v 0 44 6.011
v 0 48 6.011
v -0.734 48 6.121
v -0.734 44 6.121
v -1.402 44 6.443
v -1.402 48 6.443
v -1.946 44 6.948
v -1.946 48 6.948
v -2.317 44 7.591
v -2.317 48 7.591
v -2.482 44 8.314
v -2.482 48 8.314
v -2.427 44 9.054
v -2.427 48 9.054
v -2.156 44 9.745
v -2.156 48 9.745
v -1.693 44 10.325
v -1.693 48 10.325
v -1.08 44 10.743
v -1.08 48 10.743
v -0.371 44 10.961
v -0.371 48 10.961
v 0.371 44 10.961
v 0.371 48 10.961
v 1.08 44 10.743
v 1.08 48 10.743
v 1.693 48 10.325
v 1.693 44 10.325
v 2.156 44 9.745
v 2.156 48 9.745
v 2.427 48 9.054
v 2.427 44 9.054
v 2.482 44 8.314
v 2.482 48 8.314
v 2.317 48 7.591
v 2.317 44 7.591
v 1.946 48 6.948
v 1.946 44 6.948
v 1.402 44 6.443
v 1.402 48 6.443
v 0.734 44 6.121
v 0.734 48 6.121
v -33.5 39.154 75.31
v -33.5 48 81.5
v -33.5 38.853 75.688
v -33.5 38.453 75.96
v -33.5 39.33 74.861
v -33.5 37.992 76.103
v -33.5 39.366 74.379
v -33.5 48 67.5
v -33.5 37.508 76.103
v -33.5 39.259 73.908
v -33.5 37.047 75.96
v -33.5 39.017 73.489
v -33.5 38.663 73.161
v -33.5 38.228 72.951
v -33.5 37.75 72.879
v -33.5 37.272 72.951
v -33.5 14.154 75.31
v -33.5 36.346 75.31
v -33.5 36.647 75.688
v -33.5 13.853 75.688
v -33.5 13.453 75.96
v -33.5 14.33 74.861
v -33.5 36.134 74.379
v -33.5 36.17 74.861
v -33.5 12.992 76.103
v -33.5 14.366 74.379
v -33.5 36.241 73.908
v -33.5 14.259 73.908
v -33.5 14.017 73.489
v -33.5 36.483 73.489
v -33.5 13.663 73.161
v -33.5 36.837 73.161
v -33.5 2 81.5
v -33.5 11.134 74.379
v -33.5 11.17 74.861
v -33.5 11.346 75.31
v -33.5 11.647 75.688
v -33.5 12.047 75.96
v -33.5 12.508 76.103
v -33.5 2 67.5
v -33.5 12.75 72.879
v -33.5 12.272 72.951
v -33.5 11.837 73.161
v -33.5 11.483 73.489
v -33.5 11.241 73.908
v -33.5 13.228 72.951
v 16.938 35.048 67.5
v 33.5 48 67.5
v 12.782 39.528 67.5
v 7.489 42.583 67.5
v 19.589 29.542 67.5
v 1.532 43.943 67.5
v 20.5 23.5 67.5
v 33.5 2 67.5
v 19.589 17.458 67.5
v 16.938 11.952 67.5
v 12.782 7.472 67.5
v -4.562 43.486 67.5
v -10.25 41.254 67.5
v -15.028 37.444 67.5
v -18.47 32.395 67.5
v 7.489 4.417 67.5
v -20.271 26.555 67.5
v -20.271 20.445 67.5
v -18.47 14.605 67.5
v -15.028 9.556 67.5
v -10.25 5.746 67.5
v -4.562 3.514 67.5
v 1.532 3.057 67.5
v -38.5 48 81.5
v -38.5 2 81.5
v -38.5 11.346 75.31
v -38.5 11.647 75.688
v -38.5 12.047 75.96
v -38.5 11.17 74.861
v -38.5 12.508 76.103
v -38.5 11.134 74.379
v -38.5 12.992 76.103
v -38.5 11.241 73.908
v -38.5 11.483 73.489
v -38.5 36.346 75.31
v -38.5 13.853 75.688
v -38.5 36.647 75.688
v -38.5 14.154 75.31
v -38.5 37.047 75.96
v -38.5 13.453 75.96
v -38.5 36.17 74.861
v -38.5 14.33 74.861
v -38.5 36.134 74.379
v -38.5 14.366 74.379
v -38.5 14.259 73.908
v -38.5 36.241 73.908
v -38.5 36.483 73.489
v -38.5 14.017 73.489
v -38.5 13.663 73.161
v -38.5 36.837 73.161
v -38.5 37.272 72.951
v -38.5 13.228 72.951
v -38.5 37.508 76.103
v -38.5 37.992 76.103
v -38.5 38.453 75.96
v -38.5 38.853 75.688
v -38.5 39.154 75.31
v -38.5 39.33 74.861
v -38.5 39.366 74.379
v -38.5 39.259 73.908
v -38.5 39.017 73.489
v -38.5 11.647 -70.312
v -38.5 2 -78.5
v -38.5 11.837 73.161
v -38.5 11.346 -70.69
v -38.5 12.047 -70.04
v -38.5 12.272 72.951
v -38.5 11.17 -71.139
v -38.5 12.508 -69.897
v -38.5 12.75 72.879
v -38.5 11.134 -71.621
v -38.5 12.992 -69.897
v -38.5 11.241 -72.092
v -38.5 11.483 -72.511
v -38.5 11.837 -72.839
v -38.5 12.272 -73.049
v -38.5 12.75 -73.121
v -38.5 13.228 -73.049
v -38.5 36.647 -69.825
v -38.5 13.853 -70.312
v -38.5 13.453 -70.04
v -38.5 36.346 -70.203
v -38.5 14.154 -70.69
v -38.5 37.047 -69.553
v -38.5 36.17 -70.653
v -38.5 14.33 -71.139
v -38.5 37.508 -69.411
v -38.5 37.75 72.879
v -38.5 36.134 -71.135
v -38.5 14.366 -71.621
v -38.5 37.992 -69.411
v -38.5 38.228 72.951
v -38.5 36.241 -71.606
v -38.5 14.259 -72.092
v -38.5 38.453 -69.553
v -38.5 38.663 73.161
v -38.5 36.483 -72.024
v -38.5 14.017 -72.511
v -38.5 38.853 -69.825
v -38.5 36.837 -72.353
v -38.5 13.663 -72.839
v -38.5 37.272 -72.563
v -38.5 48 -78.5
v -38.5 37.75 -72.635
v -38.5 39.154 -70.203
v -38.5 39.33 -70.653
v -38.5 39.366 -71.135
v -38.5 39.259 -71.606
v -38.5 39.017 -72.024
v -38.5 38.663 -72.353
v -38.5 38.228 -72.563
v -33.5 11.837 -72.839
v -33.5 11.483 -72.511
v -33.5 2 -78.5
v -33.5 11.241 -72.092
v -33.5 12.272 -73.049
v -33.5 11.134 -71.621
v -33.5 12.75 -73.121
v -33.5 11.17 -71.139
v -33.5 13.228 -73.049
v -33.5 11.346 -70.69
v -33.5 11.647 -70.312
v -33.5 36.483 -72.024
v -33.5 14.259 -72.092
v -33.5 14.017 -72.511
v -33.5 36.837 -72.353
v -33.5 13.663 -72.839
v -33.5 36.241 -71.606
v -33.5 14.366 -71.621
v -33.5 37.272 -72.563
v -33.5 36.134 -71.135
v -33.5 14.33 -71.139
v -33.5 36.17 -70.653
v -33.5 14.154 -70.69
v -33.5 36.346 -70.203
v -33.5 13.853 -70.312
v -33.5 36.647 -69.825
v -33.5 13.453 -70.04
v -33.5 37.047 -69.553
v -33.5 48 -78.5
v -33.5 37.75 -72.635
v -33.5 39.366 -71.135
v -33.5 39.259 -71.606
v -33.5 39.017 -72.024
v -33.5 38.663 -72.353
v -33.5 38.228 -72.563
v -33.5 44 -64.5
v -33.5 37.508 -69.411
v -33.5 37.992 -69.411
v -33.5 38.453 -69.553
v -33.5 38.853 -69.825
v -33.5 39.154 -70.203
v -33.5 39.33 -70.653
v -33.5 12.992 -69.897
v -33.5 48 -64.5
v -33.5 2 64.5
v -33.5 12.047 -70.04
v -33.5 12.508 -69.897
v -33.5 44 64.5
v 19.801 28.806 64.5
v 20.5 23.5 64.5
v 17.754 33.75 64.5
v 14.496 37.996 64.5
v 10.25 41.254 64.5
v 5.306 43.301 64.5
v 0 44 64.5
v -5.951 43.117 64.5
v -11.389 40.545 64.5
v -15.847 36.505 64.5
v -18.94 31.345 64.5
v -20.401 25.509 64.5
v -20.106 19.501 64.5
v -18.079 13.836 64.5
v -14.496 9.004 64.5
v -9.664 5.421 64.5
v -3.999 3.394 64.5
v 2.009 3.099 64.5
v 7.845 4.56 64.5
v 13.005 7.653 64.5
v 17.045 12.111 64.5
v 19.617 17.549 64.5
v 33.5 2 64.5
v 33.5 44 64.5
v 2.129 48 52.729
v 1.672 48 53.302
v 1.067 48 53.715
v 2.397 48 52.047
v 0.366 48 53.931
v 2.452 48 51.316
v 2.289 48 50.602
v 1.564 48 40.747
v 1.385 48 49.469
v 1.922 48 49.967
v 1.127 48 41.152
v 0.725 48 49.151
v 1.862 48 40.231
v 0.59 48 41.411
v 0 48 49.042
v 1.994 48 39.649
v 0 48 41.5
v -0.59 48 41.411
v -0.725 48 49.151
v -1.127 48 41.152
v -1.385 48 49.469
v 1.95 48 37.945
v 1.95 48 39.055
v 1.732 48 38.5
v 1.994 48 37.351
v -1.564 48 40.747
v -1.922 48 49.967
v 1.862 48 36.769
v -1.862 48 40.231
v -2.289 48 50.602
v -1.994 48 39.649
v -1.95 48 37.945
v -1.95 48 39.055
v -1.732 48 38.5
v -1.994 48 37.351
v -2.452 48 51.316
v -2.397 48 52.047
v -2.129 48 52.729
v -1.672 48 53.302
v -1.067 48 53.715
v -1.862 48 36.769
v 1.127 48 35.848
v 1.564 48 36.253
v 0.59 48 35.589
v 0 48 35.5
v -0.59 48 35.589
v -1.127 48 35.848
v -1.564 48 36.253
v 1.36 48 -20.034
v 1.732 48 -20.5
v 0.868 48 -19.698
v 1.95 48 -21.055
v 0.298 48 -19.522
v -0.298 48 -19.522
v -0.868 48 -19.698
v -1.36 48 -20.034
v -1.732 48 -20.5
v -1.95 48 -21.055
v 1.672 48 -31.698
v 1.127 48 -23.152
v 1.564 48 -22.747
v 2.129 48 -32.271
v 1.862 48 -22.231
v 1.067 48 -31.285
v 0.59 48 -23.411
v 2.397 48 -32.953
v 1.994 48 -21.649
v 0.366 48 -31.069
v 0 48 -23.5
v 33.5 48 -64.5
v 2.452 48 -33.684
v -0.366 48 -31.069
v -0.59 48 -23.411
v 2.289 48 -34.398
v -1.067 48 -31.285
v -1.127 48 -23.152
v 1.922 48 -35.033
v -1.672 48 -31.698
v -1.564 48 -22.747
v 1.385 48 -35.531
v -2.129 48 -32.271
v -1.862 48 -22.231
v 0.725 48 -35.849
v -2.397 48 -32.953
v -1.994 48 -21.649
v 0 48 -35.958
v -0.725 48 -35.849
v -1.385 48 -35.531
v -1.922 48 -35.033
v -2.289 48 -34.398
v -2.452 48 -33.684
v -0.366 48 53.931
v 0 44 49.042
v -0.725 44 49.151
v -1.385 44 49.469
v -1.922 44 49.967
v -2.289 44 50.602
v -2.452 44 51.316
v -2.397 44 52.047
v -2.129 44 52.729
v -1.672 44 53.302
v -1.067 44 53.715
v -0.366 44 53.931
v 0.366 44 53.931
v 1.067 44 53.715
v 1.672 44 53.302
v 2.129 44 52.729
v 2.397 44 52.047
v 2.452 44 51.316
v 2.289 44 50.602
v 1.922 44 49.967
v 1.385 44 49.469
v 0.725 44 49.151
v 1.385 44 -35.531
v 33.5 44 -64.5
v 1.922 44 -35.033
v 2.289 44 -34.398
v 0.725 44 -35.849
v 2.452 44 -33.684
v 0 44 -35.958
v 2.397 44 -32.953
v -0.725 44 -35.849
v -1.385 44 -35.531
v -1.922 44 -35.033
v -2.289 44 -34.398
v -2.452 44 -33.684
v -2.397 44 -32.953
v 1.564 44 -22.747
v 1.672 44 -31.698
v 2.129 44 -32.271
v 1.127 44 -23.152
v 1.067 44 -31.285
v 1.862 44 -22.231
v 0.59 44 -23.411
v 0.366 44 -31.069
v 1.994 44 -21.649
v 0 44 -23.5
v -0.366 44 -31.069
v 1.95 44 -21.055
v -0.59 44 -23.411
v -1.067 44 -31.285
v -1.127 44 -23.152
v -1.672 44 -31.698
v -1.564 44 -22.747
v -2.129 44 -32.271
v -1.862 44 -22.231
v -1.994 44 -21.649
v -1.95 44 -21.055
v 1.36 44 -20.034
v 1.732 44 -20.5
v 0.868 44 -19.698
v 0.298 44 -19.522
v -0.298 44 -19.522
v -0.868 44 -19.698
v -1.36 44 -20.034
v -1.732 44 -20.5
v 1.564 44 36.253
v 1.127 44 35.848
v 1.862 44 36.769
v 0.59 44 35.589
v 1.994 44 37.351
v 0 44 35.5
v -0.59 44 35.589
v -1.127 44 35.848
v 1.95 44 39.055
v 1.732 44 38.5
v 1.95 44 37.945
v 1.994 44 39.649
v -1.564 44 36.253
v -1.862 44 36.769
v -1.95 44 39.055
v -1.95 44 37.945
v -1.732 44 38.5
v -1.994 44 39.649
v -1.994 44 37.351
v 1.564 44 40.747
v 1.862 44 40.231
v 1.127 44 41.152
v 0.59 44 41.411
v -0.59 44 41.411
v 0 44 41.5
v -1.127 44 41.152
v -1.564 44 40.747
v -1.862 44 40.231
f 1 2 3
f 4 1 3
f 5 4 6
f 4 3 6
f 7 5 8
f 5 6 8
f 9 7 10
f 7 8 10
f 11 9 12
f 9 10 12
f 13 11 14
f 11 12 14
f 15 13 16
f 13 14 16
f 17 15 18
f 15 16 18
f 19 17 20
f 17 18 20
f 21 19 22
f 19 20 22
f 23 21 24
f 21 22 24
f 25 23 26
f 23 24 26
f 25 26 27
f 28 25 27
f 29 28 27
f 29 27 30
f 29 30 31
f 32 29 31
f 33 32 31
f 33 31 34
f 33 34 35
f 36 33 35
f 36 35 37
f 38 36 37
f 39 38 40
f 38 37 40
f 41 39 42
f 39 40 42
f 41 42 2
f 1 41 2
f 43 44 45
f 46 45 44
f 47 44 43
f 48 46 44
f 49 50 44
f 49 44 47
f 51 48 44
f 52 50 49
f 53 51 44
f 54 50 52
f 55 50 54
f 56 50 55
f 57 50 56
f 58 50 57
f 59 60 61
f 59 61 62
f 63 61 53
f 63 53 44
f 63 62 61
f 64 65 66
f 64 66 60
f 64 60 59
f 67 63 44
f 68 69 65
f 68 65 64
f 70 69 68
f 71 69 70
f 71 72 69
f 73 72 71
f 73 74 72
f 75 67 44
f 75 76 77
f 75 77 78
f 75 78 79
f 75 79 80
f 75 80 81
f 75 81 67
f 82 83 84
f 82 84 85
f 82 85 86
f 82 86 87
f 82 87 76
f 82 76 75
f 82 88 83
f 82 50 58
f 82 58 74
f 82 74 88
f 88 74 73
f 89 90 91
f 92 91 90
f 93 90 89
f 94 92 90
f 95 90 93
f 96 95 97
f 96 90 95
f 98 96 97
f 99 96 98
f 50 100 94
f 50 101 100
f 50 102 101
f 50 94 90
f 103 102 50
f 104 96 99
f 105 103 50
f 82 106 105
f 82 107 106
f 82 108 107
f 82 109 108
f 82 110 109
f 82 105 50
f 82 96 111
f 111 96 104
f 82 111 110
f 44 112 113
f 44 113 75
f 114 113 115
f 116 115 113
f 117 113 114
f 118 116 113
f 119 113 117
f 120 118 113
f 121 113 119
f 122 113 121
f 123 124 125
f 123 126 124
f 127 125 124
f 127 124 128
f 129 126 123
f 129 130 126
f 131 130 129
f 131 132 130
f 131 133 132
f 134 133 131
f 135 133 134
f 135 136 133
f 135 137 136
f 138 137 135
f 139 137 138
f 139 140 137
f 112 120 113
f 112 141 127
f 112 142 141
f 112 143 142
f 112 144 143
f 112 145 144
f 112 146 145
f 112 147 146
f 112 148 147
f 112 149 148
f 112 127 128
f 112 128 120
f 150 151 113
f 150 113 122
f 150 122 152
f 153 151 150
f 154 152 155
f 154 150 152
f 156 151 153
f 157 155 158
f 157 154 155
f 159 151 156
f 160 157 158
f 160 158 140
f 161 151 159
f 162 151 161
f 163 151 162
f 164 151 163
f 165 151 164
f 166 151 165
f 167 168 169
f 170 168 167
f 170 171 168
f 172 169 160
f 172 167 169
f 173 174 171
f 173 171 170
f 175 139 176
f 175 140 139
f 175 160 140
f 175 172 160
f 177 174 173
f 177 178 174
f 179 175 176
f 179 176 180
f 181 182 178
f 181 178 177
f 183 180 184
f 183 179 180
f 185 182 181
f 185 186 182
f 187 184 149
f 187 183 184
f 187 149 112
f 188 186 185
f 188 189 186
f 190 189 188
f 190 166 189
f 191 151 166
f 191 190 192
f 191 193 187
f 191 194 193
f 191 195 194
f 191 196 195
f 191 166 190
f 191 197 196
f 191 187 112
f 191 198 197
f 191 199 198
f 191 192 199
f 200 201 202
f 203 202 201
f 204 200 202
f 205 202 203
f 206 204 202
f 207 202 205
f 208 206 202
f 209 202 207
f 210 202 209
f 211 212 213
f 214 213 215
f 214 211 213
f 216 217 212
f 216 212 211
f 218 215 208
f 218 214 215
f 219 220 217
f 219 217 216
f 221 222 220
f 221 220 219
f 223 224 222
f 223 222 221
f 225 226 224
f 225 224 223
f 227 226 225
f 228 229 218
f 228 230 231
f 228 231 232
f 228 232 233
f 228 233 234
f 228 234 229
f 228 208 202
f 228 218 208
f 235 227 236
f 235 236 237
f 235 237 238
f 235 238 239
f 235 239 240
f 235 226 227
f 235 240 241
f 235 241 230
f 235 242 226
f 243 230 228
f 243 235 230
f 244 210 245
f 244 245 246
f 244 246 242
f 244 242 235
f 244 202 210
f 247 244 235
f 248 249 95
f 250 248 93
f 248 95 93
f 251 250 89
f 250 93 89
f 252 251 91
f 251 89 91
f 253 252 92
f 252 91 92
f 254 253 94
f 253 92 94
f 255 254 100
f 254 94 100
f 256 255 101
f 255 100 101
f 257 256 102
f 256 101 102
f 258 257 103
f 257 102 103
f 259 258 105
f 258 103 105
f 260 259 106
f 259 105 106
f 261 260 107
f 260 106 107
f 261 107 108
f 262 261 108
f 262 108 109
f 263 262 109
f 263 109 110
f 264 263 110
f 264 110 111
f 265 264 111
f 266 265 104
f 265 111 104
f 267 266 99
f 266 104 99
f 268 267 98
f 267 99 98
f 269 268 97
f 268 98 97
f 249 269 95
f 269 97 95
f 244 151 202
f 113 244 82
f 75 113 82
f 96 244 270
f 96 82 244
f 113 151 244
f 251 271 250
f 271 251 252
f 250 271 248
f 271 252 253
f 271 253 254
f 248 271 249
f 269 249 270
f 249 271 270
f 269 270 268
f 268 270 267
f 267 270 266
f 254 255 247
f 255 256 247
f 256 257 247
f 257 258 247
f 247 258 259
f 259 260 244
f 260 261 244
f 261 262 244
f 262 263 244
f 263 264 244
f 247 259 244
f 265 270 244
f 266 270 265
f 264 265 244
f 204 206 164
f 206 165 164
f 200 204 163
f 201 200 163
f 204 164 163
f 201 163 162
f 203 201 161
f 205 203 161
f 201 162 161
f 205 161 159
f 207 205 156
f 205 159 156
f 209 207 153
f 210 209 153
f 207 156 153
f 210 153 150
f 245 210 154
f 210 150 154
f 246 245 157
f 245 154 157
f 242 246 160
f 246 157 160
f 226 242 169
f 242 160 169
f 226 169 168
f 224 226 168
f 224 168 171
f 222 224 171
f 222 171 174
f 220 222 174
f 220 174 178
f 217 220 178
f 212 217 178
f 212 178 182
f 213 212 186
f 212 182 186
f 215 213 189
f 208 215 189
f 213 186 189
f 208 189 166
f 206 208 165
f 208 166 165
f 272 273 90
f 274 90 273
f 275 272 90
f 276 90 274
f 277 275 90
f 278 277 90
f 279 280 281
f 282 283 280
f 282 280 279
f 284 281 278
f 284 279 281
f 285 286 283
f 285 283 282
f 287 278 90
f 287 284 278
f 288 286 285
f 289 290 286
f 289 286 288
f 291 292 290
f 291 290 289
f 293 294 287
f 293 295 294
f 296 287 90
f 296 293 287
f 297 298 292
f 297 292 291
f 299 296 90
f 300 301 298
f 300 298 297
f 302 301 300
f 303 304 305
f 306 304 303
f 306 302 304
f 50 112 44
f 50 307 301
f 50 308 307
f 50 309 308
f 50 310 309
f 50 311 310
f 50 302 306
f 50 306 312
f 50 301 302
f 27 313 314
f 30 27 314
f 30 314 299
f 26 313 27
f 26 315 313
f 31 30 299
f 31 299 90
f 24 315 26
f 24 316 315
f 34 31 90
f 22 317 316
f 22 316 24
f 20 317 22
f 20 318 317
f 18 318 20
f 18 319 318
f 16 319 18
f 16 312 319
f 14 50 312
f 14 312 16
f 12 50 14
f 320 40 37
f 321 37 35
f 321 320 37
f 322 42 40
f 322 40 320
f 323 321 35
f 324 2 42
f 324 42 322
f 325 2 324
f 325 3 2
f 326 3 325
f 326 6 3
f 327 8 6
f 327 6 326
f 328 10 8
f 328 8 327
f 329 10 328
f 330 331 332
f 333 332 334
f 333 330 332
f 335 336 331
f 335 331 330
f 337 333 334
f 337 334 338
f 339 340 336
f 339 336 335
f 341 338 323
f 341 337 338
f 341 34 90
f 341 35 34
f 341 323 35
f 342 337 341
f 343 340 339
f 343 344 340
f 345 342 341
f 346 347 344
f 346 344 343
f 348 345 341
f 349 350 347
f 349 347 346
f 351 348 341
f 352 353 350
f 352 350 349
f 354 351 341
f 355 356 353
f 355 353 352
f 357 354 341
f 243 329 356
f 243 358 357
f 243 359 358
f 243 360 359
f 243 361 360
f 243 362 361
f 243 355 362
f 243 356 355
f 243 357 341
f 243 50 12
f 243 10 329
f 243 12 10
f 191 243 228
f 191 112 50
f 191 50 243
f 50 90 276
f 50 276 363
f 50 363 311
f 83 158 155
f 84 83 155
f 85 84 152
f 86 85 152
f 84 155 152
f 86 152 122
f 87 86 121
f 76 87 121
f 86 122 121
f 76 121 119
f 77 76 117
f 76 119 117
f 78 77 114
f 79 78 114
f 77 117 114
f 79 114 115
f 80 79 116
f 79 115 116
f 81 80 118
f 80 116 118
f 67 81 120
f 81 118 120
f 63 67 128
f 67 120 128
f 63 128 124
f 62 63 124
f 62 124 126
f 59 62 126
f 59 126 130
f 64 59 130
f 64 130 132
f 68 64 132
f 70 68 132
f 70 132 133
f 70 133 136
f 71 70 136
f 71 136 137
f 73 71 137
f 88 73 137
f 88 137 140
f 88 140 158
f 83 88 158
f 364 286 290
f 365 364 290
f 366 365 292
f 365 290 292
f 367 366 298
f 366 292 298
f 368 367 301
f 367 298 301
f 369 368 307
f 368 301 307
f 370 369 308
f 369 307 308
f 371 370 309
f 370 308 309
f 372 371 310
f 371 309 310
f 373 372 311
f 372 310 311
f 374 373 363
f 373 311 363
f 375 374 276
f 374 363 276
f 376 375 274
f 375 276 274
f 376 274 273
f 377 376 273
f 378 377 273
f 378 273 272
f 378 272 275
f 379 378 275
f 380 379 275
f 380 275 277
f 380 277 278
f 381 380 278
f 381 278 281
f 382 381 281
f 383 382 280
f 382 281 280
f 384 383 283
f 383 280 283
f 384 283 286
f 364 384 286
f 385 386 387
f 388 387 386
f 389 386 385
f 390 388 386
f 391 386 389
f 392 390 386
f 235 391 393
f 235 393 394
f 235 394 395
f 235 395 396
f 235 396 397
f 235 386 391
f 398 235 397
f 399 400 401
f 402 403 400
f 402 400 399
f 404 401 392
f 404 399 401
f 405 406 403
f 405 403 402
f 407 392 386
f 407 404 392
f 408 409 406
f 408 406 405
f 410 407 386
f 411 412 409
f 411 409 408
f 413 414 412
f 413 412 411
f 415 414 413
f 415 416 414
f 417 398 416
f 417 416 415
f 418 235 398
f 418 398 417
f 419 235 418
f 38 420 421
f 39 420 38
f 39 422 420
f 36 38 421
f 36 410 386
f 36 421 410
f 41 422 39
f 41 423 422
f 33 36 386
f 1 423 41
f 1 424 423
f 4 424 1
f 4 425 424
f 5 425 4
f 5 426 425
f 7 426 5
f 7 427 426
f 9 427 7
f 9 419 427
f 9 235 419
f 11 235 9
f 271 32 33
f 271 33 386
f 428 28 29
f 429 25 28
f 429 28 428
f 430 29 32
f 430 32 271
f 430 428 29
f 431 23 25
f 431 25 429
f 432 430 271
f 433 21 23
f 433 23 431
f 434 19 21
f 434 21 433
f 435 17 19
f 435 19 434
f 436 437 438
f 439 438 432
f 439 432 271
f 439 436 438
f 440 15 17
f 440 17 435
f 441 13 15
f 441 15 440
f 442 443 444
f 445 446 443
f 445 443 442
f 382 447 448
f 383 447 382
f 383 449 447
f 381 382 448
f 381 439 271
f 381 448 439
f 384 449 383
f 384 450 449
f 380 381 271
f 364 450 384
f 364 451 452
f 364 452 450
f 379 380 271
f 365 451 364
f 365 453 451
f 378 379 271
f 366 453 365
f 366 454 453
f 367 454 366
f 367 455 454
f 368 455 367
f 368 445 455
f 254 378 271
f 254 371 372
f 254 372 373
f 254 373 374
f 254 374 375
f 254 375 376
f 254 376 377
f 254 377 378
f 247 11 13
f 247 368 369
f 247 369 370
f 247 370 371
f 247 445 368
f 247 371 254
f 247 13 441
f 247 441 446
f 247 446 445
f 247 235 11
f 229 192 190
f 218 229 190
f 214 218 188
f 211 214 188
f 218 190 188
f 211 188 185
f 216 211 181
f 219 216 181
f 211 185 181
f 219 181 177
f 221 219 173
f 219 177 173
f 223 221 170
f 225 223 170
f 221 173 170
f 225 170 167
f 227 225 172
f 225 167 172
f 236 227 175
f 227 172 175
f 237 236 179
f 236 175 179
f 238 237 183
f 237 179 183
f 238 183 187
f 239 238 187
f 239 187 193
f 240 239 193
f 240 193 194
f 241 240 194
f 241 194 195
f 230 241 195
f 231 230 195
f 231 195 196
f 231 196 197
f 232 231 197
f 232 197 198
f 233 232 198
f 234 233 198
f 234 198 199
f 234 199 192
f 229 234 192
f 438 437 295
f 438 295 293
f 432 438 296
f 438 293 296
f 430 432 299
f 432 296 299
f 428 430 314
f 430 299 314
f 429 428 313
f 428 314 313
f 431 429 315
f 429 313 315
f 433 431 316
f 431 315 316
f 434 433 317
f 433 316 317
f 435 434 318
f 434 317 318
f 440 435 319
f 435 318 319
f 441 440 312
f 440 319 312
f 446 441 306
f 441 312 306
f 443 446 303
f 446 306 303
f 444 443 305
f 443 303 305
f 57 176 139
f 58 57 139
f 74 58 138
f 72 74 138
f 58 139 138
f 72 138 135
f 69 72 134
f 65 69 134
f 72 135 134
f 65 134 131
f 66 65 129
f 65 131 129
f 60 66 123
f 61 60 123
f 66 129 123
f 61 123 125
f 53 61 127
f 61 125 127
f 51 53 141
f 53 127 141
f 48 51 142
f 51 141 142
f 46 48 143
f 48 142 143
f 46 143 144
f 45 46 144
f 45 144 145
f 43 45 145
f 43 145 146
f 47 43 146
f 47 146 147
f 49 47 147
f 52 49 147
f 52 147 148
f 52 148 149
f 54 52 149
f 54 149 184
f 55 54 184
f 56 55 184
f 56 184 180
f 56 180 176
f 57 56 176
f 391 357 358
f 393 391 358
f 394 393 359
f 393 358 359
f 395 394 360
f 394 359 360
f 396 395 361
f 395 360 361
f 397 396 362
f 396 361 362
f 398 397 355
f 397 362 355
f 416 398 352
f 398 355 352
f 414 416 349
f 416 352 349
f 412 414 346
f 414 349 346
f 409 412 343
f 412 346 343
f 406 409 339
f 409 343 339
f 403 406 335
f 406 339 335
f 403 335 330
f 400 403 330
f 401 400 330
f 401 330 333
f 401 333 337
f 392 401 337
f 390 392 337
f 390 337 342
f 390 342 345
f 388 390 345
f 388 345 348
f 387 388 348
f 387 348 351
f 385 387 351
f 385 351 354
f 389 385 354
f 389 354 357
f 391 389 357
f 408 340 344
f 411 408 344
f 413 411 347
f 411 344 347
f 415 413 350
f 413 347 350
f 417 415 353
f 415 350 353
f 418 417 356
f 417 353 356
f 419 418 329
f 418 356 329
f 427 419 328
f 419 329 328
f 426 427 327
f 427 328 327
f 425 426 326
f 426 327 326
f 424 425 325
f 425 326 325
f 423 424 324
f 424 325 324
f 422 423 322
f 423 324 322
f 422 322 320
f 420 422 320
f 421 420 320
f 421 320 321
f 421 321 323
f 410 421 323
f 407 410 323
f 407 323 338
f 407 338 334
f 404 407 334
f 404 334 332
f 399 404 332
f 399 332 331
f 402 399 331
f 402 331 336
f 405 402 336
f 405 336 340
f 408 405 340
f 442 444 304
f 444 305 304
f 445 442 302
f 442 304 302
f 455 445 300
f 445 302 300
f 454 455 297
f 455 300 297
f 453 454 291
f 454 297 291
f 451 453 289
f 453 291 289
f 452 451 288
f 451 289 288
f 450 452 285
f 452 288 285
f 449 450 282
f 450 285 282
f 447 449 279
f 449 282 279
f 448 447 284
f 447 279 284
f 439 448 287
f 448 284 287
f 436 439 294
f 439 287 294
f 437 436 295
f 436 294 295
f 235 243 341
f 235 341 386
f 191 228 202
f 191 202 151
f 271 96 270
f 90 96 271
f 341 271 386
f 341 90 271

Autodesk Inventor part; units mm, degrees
ref_plane "YZ Plane" through (0, 0, 0) normal (1, 0, 0) x (0, 1, 0)
ref_plane "XZ Plane" through (0, 0, 0) normal (0, 1, 0) x (-1, 0, 0)
ref_plane "XY Plane" through (0, 0, 0) normal (0, 0, 1) x (1, 0, 0)
sketch "Sketch1" plane through (0, 0, 0) normal (0, 1, 0) x (-1, 0, 0)
  line L0 (33.5, 64.5) -> (-33.5, 64.5)
  line L1 (-33.5, 64.5) -> (-33.5, -64.5)
  line L2 (-33.5, -64.5) -> (33.5, -64.5)
  line L3 (33.5, -64.5) -> (33.5, 64.5)
  line L4 (33.5, 64.5) -> (-33.5, -64.5) construction
  line L5 (-33.5, 64.5) -> (33.5, -64.5) construction
  point P0 (0, 0)
  dimension "d0" = 67
  dimension "d1" = 129
extrude "Extrusion1" add sketch "Sketch1" along normal blind 3
sketch "Sketch2" plane through (0, 0, 0) normal (0, -1, 0) x (1, 0, 0)
  circle A0 centre (0, 51.5) radius 3
  line L0 (-2, 39.5) -> (-2, 37.5)
  line L1 (2, 37.5) -> (2, 39.5)
  circle A1 centre (0, 8.5) radius 3.487
  circle A2 centre (0, -21.5) radius 2
  circle A3 centre (0, -33.5) radius 3
  arc A4 (2, 39.5) -> (-2, 39.5) centre (0, 39.5) ccw
  arc A5 (-2, 37.5) -> (2, 37.5) centre (0, 37.5) ccw
  line L2 (-33.5, 64.5) -> (33.5, 64.5) projected
  point P0 (0, 0)
  point P1 (2, 38.5)
  point P2 (-2, 38.5)
  dimension "d4" = 6
  dimension "d7" = 4
  dimension "d8" = 6
  dimension "d9" = 13
  dimension "d10" = 56
  dimension "d11" = 26
  dimension "d12" = 60
  dimension "d13" = 85
hole "Hole1" at (0, 0, 51.5) at (0, 0, -33.5) direction (0, 1, 0) diameter 4.917 depth 17.1 thread size "M6x1" class "6H" standard "ANSI Metric M Profile"
hole "Hole2" at (0, 0, -21.5) at (0, 0, 39.5) at (0, 0, 37.5) direction (0, 1, 0) diameter 4 depth 17.1
hole "Hole3" at (0, 0, 8.5) direction (0, 1, 0) diameter 4.9784 depth 19.05 thread size "1/4-20 UNC" class "2B" standard "ANSI Unified Screw Threads"
sketch "Sketch3" plane through (-33.5, 0, 64.5) normal (0, 0, 1) x (1, 0, 0)
  line L0 (0, 3) -> (67, 3) projected
  line L1 (0, 3) -> (67, 3)
  line L2 (67, 3) -> (67, 0)
  line L3 (67, 0) -> (0, 0)
  line L4 (0, 0) -> (0, 3)
  point P0 (33.5, 0)
extrude "Extrusion2" add sketch "Sketch3" along normal blind 3
sketch "Sketch4" plane through (0, 3, 0) normal (0, 1, 0) x (1, 0, 0)
  line L0 (-33.5, 64.5) -> (-33.5, -67.5) projected
  line L1 (33.5, 64.5) -> (33.5, -67.5) projected
  line L2 (-33.5, -67.5) -> (33.5, -67.5)
  line L3 (33.5, -67.5) -> (33.5, -64.5)
  line L4 (33.5, -64.5) -> (-33.5, -64.5)
  line L5 (-33.5, -64.5) -> (-33.5, -67.5)
  point P0 (0, 0)
  point P1 (-33.5, -64.5)
  dimension "d37" = 3
extrude "Extrusion3" add sketch "Sketch4" along normal blind 45
sketch "Sketch5" plane through (-33.5, 0, 67.5) normal (0, 0, 1) x (1, 0, 0)
  circle A0 centre (33.5, 23.5) radius 20.5
  line L0 (0, 0) -> (67, 0) projected
  line L1 (0, 48) -> (67, 48) projected
  point P0 (33.5, 0)
  point P1 (33.5, 48)
  dimension "d40" = 41
  dimension "d41" = 23.5
extrude "Extrusion4" cut sketch "Sketch5" against normal blind 45
sketch "Sketch6" plane through (-33.5, 0, -64.5) normal (-1, 0, 0) x (0, 0, 1)
  line L0 (0, 0) -> (0, 3) projected
  line L1 (132, 0) -> (0, 0) projected
  line L2 (0, 3) -> (132, 3)
  line L3 (132, 3) -> (132, 0)
  line L4 (132, 0) -> (0, 0)
  line L5 (0, 0) -> (0, 3)
  point P0 (64.5, 0)
extrude "Extrusion5" add sketch "Sketch6" along normal blind 5
sketch "Sketch7" plane through (0, 3, 0) normal (0, 1, 0) x (1, 0, 0)
  line L0 (33.5, -67.5) -> (-38.5, -67.5) projected
  line L1 (33.5, 64.5) -> (-38.5, 64.5) projected
  line L2 (-38.5, -67.5) -> (-33.5, -67.5)
  line L3 (-33.5, -67.5) -> (-33.5, 64.5)
  line L4 (-33.5, 64.5) -> (-38.5, 64.5)
  line L5 (-38.5, 64.5) -> (-38.5, -67.5)
  point P0 (0, 0)
  point P1 (-38.5, 64.5)
  dimension "d46" = 5
extrude "Extrusion6" add sketch "Sketch7" along normal blind 45
sketch "Sketch8" plane through (33.5, 0, -64.5) normal (0, 0, -1) x (-1, 0, 0)
  line L0 (0, 48) -> (67, 48) projected
  line L1 (72, 0) -> (72, 48) projected
  line L2 (67, 48) -> (72, 48)
  line L3 (72, 48) -> (72, 0)
  line L4 (72, 0) -> (67, 0)
  line L5 (67, 0) -> (67, 48)
  point P0 (33.5, 0)
extrude "Extrusion7" add sketch "Sketch8" along normal blind 14
sketch "Sketch9" plane through (-33.5, 0, 67.5) normal (0, 0, 1) x (1, 0, 0)
  line L0 (-5, 0) -> (-5, 48) projected
  line L1 (67, 0) -> (-5, 0) projected
  line L2 (-5, 48) -> (0, 48)
  line L3 (0, 48) -> (0, 0)
  line L4 (0, 0) -> (-5, 0)
  line L5 (-5, 0) -> (-5, 48)
  point P0 (33.5, 0)
  dimension "d51" = 5
extrude "Extrusion8" add sketch "Sketch9" along normal blind 14
sketch "Sketch10" plane through (0, 0, 0) normal (0, -1, 0) x (1, 0, 0)
  line L0 (-33.5, 64.5) -> (-33.5, -78.5) projected
  line L1 (-38.5, 81.5) -> (-33.5, 81.5) projected
  line L2 (-33.5, -78.5) -> (-38.5, -78.5)
  line L3 (-38.5, -78.5) -> (-38.5, 81.5)
  line L4 (-38.5, 81.5) -> (-33.5, 81.5)
  line L5 (-33.5, 81.5) -> (-33.5, -78.5)
  point P0 (0, 0)
sketch "Sketch11" plane through (-33.5, 3, 64.5) normal (1, 0, 0) x (0, 0, -1)
  circle A0 centre (136, 9.75) radius 2
  circle A1 centre (135.5136, 34.75) radius 2
  line L0 (143, -5) -> (-17, -5) projected
  line L1 (143, 45) -> (143, -3) projected
  circle A2 centre (-10, 9.75) radius 2
  circle A3 centre (-10, 34.75) radius 2
  line L2 (-17, 45) -> (-17, -5) projected
  point P0 (64.5, -3)
  dimension "d56" = 4
  dimension "d57" = 4
  dimension "d58" = 14.75
  dimension "d59" = 7
  dimension "d60" = 25
  dimension "d68" = 4
  dimension "d69" = 14.75
  dimension "d70" = 7
  dimension "d71" = 7
  dimension "d72" = 25
hole "Hole4" at (-33.5, 37.75, -71.0136) at (-33.5, 12.75, -71.5) at (-33.5, 37.75, 74.5) at (-33.5, 12.75, 74.5) direction (-1, 0, 0) diameter 3.242 depth 10 tip angle 118 thread size "M4x0.7" class "6H" standard "ANSI Metric M Profile"
sketch "Sketch12" plane through (-33.5, 3, 64.5) normal (1, 0, 0) x (0, 0, -1)
  line L0 (-3, 45) -> (0, 45) projected
  line L1 (0, 45) -> (129, 45)
  line L2 (129, 45) -> (129, 41)
  line L3 (129, 41) -> (0, 41)
  line L4 (0, 41) -> (0, 45)
  point P0 (64.5, -3)
  dimension "d73" = 129
  dimension "d74" = 4
extrude "Extrusion10" add sketch "Sketch12" along normal up to surface (67 mm away)
hole "Hole5" at (0, 0, 51.5) at (0, 0, -33.5) direction (0, 1, 0) diameter 4.917 end through all thread size "M6x1" class "6H" standard "ANSI Metric M Profile"
hole "Hole6" at (0, 0, 8.5) direction (0, 1, 0) diameter 4.9784 end through all thread size "1/4-20 UNC" class "2B" standard "ANSI Unified Screw Threads"
hole "Hole7" at (0, 0, -21.5) at (0, 0, 39.5) at (0, 0, 37.5) direction (0, 1, 0) diameter 4 end through all
sketch "Sketch13" plane through (0, 3, 0) normal (0, 1, 0) x (1, 0, 0)
  line L0 (-33.5, 64.5) -> (-33.5, -64.5) projected
  line L1 (33.5, 64.5) -> (-33.5, 64.5) projected
  line L2 (-33.5, -64.5) -> (33.5, -64.5)
  line L3 (33.5, -64.5) -> (33.5, 64.5)
  line L4 (33.5, 64.5) -> (-33.5, 64.5)
  line L5 (-33.5, 64.5) -> (-33.5, -64.5)
  point P0 (0, 0)
extrude "Extrusion11" cut sketch "Sketch13" against normal blind 10
sketch "Sketch14" plane through (0, 0, 0) normal (0, -1, 0) x (1, 0, 0)
  line L0 (58.5292, 135.8199) -> (-75.2061, 135.8199)
  line L1 (-75.2061, 135.8199) -> (-75.2061, -131.0093)
  line L2 (-75.2061, -131.0093) -> (58.5292, -131.0093)
  line L3 (58.5292, -131.0093) -> (58.5292, 135.8199)
  point P0 (0, 0)
extrude "Extrusion12" cut sketch "Sketch14" against normal blind 2
properties part number "Laser Bracket"
